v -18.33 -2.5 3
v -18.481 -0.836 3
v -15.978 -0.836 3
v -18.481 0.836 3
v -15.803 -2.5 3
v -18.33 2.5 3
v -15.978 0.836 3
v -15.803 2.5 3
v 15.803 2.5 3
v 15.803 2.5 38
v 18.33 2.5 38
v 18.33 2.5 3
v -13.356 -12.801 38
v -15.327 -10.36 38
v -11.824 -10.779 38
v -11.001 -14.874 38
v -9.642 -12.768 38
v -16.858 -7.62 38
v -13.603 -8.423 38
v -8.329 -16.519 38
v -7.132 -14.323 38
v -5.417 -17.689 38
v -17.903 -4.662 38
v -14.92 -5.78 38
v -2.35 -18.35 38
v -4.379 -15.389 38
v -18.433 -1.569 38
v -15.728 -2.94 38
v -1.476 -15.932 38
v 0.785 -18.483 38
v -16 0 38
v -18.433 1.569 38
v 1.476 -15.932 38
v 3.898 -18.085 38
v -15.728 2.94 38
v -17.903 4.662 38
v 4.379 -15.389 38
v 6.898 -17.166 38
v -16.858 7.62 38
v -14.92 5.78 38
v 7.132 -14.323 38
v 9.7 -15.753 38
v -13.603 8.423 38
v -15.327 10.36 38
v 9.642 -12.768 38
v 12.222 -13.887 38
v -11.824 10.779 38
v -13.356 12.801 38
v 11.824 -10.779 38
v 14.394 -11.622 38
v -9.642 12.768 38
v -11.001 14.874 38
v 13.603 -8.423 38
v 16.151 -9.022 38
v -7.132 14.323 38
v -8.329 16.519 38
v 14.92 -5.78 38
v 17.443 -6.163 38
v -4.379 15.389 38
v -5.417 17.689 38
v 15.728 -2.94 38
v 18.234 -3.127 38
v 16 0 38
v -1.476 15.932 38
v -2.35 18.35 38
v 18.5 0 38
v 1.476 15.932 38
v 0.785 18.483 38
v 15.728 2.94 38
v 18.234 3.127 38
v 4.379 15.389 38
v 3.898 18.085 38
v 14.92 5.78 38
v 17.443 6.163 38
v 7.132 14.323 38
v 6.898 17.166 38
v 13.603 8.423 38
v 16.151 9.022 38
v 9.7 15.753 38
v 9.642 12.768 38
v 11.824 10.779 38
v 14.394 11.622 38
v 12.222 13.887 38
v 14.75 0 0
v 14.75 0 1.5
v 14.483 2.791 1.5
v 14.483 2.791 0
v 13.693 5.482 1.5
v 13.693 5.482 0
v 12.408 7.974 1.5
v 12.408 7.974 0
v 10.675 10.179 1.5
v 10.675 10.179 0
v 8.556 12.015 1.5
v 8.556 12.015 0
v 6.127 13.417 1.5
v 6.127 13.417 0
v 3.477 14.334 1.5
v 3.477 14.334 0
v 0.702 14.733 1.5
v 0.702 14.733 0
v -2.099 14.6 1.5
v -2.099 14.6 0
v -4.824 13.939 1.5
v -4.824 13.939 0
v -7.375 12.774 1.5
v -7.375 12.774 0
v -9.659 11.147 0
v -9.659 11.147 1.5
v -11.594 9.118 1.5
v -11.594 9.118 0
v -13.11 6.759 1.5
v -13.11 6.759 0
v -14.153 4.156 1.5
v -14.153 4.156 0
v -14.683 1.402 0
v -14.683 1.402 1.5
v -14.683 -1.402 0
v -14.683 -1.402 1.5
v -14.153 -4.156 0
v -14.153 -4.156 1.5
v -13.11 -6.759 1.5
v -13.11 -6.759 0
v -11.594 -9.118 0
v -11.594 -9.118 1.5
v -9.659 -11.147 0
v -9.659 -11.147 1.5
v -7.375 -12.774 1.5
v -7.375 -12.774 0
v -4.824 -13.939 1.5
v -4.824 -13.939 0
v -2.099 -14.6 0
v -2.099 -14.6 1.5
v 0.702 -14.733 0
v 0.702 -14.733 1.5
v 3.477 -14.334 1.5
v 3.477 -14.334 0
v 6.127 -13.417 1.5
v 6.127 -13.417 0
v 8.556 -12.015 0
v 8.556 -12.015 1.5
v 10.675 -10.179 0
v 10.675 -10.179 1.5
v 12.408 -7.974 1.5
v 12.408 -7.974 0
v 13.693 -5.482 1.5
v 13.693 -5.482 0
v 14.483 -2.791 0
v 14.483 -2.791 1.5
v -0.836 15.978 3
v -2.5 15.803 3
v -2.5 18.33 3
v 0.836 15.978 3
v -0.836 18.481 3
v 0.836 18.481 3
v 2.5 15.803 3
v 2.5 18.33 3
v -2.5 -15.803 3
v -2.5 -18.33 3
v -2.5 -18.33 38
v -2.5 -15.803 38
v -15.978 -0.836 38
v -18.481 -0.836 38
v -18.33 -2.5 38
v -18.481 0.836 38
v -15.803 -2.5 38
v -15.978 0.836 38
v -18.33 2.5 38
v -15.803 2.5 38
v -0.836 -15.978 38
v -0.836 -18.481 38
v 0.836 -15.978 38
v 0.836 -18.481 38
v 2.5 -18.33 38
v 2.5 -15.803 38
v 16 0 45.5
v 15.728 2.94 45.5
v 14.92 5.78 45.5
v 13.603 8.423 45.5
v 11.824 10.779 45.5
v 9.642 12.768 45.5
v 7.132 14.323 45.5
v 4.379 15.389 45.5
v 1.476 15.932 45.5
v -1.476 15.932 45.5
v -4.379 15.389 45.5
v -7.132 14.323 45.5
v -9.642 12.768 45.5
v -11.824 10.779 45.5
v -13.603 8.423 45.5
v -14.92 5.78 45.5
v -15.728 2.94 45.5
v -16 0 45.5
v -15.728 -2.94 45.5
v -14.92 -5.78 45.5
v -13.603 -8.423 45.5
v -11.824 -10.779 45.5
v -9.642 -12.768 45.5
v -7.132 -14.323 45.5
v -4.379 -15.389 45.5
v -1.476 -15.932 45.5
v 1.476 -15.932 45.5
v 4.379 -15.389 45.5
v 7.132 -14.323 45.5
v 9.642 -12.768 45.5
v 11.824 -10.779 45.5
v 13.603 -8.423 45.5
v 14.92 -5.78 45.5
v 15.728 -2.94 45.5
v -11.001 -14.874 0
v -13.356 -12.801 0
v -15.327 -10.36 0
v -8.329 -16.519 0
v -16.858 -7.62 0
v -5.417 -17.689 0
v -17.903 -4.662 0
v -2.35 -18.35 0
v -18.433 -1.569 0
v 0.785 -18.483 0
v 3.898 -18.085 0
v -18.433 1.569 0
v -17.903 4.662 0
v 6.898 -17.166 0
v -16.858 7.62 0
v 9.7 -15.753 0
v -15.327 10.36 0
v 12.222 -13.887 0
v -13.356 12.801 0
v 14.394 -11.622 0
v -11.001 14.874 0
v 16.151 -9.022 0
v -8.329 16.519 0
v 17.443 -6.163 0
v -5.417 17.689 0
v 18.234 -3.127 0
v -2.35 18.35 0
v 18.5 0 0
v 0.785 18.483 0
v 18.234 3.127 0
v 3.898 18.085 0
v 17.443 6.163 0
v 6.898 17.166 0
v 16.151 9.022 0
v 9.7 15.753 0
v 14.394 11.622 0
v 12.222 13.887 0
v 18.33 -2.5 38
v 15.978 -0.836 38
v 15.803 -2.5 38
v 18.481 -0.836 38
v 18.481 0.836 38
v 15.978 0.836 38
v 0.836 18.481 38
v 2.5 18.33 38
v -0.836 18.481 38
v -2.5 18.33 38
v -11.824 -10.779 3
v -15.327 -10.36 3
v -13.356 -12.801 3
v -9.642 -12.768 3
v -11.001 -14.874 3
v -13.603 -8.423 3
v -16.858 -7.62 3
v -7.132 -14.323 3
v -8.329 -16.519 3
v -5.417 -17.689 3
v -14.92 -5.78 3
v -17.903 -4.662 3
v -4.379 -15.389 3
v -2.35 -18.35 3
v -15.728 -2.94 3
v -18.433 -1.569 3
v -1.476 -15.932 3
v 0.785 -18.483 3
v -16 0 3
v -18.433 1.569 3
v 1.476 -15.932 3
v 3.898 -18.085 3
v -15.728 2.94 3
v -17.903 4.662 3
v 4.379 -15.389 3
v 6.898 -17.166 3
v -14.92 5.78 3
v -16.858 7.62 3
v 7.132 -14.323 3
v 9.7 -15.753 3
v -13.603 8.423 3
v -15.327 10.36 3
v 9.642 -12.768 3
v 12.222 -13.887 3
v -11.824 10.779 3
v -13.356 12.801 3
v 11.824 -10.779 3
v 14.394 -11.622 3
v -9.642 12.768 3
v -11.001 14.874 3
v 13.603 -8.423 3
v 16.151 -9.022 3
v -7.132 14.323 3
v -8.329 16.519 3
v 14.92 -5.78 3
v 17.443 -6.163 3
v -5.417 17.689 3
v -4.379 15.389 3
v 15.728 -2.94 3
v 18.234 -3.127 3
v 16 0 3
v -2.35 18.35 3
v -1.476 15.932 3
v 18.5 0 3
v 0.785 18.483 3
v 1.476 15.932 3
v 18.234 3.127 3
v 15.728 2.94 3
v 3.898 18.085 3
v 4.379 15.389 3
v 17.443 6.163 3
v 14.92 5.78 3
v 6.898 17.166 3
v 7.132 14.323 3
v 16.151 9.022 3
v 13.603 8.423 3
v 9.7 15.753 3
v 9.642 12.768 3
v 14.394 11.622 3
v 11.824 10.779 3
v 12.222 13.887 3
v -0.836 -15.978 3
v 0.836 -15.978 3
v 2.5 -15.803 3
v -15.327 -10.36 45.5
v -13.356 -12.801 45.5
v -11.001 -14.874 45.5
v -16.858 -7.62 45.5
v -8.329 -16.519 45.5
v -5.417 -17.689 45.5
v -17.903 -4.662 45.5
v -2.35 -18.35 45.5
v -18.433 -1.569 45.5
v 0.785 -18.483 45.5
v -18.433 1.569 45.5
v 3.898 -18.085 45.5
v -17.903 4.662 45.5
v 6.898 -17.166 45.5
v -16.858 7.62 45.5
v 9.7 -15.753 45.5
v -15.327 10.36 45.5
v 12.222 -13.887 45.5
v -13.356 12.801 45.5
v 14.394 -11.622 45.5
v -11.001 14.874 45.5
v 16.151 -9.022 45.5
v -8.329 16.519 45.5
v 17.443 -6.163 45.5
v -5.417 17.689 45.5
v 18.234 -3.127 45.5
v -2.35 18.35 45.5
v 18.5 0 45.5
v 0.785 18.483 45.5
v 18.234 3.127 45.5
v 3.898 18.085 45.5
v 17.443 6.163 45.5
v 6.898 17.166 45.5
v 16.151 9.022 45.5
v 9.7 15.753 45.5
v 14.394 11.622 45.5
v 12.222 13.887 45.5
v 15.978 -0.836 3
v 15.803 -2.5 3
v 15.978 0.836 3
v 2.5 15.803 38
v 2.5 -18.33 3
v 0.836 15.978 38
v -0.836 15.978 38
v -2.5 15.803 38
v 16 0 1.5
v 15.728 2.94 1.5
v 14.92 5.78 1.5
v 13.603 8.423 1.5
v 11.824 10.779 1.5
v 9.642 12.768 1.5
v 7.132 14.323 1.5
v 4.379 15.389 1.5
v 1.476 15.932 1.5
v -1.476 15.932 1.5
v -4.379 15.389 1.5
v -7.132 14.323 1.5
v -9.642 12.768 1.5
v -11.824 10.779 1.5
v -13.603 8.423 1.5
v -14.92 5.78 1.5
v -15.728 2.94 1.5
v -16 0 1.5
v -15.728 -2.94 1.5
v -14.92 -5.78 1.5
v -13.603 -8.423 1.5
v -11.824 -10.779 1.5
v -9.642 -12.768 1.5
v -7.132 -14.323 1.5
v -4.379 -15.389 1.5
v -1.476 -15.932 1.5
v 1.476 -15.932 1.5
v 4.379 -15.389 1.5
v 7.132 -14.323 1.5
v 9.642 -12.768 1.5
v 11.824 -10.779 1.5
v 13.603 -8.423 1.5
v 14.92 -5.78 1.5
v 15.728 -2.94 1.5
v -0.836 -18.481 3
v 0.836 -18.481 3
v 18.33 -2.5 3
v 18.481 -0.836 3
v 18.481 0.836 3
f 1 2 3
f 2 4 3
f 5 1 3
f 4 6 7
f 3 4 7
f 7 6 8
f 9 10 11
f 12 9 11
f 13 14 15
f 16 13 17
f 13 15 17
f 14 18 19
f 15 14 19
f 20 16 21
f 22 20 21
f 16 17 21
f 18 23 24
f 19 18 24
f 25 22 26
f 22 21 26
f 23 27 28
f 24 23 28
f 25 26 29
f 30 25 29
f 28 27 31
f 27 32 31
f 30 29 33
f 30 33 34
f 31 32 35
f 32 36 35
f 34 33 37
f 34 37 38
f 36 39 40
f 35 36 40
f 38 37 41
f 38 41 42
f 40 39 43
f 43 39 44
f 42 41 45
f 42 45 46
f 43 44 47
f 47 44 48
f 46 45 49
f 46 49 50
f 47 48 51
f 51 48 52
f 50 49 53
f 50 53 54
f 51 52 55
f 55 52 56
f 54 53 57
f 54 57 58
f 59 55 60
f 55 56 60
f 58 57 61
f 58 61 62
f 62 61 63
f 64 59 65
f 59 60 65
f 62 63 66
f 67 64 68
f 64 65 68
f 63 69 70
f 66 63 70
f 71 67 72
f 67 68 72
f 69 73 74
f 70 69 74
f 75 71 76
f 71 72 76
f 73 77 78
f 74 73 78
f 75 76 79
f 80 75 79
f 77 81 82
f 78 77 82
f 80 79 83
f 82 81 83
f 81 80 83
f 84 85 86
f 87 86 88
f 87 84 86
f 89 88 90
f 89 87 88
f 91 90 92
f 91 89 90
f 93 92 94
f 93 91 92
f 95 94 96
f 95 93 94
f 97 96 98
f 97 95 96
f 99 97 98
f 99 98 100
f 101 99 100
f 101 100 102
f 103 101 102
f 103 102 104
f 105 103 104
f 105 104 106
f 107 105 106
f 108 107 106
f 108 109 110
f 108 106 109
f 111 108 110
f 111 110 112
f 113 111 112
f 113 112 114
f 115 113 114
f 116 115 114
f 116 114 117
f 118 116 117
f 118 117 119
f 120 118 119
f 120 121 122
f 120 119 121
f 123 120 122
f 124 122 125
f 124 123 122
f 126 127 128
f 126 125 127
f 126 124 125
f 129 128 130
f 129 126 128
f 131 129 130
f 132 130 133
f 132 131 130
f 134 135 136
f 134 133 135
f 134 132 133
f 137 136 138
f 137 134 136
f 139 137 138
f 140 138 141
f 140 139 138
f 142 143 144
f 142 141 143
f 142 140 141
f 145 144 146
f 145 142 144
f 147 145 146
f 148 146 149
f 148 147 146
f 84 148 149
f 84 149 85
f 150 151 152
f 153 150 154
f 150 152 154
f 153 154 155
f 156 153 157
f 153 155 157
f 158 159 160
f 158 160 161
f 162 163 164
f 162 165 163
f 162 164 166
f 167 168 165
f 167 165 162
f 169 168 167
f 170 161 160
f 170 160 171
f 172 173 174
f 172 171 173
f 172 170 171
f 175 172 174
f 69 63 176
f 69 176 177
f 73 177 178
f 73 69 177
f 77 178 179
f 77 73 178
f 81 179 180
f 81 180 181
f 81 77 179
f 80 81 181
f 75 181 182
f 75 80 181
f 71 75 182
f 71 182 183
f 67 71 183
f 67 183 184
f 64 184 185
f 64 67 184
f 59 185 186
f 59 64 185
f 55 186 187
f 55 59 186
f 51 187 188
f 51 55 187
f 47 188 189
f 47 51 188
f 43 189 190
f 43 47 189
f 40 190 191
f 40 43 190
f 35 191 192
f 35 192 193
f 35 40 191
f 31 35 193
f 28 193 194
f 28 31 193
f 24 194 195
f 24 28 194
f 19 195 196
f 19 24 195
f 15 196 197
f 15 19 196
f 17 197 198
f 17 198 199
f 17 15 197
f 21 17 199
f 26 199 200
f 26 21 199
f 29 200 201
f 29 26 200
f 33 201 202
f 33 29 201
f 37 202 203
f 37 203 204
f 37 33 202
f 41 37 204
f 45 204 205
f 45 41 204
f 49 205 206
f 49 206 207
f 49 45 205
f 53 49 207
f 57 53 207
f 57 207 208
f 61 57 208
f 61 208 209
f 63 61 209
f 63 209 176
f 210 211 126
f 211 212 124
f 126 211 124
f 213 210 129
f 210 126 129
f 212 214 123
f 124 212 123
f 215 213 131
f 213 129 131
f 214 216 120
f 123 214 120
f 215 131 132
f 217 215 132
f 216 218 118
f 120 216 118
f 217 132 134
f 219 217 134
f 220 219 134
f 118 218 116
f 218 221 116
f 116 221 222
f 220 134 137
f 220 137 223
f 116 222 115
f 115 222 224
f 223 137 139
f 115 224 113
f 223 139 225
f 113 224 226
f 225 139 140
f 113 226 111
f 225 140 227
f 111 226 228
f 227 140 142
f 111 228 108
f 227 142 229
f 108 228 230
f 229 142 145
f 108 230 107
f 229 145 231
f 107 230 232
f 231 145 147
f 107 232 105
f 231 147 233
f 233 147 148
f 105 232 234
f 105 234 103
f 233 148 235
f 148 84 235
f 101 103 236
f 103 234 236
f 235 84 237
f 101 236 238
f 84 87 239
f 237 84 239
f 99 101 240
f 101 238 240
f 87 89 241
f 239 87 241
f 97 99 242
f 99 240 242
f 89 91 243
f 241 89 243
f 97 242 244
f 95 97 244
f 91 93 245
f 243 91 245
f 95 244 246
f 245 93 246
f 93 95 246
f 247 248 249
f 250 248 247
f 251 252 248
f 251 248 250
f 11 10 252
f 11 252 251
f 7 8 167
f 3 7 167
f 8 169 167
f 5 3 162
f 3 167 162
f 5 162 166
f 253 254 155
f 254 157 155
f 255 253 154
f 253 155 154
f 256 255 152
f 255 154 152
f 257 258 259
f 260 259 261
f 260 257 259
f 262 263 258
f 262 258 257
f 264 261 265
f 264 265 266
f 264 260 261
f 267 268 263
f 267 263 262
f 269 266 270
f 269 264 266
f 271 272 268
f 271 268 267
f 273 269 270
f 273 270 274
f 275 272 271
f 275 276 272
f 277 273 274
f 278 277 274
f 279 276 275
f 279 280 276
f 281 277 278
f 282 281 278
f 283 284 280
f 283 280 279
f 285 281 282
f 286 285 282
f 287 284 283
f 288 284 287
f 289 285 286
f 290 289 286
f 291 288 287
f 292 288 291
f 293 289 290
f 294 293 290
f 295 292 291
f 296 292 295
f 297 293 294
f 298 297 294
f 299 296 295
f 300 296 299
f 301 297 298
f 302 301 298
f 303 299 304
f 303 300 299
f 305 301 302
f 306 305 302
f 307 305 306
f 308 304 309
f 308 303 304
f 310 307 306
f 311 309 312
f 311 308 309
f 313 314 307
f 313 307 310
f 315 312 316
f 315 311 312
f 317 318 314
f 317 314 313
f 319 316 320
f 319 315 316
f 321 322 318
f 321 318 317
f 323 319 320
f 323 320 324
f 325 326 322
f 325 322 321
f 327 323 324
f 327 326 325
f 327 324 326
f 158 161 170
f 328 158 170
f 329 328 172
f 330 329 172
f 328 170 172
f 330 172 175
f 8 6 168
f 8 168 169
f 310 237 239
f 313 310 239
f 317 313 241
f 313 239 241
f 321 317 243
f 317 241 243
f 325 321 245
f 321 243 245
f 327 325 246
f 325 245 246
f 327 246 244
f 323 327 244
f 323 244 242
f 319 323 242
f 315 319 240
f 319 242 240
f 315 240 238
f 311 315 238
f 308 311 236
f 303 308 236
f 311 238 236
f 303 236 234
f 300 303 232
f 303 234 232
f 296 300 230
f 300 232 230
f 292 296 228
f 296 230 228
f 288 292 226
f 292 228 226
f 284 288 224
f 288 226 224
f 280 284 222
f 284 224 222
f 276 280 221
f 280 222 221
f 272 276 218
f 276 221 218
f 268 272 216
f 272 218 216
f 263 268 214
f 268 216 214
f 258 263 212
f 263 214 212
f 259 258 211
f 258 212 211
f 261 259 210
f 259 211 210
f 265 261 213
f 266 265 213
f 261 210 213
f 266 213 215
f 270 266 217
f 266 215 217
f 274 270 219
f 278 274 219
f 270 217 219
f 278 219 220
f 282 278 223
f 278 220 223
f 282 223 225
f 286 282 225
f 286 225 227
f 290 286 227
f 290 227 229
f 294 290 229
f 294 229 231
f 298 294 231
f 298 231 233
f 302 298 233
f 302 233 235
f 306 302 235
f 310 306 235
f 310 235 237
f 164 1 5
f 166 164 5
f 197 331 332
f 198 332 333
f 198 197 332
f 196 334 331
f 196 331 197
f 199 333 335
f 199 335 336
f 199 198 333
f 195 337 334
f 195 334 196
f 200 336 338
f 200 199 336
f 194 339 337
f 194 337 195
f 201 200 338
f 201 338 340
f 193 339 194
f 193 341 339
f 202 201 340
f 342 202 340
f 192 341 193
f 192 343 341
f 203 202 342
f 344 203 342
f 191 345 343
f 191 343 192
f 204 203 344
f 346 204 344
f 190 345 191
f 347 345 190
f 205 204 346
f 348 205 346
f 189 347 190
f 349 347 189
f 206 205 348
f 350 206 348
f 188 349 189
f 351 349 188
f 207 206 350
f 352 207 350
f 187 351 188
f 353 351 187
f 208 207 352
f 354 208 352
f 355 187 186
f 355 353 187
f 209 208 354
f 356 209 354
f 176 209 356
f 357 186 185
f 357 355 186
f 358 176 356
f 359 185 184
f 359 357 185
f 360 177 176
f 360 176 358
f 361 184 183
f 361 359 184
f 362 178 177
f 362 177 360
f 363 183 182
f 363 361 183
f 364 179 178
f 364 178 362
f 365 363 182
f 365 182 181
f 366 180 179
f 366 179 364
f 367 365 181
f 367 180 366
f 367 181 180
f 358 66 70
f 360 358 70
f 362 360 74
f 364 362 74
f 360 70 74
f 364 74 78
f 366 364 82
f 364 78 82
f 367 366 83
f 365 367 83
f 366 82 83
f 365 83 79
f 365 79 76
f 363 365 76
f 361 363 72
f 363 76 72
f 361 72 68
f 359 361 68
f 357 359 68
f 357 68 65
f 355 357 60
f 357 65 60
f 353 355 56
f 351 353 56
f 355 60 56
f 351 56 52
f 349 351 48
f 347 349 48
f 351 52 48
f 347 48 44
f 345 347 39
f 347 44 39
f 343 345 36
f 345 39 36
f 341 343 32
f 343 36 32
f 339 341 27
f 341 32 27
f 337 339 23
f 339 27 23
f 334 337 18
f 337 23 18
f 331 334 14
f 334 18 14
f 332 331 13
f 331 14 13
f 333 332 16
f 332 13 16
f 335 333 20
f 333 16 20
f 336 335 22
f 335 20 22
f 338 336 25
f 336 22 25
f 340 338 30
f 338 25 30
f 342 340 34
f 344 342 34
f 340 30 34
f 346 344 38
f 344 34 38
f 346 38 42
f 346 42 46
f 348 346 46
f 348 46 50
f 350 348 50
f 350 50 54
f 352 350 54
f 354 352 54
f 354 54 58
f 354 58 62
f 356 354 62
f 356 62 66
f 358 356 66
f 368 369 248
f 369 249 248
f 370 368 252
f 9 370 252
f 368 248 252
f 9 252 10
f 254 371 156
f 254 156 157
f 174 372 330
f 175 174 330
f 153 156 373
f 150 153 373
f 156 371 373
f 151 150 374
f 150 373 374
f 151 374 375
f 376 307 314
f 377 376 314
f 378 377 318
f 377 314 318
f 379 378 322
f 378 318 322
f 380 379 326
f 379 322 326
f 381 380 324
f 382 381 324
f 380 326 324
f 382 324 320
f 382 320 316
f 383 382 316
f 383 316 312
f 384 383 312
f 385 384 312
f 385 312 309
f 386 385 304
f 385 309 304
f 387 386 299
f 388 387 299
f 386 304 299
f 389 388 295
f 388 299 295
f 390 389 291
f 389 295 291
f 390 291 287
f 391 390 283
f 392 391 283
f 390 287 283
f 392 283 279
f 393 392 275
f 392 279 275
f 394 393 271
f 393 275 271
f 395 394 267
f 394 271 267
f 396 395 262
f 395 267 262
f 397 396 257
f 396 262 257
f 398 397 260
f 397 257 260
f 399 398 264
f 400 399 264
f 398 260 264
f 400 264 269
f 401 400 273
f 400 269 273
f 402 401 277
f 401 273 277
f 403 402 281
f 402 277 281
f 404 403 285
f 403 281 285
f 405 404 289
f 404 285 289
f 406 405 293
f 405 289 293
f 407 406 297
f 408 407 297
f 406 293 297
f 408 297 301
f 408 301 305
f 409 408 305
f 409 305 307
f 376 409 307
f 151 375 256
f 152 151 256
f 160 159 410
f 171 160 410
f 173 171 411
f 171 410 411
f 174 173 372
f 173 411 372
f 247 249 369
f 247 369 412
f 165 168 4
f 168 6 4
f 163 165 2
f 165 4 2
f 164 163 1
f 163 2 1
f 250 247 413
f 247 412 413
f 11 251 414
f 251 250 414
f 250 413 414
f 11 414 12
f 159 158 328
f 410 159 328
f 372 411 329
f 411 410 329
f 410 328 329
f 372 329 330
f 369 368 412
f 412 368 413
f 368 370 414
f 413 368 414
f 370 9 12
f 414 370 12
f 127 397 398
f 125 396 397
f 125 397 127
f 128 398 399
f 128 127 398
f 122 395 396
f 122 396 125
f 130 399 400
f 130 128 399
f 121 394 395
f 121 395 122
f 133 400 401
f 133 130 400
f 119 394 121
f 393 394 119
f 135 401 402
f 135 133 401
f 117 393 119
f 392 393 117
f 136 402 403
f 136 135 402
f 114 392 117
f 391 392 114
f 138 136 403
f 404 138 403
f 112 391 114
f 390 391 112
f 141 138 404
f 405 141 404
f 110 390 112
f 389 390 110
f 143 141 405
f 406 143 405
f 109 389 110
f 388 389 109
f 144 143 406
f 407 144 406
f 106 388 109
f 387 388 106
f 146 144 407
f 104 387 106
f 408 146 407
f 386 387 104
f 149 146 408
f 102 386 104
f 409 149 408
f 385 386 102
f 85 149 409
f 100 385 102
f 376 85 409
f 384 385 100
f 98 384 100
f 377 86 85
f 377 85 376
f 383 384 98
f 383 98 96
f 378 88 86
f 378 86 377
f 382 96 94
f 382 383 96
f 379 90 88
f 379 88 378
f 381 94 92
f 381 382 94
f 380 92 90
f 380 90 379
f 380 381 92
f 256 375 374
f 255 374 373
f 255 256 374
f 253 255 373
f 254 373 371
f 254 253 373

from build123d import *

# Parameters (mm, degrees)
F0_R      = 18.5
F0_R_2    = 14.75
F1_DEPTH  = 45
F2_R      = 16
F2_R_2    = 14.75
F3_DEPTH  = 43
F5_W      = 34.343095
F5_H      = 5
F5_W_2    = 5
F5_H_2    = 31.673071
F6_DEPTH  = 35
F7_R      = 18.5
F7_R_2    = 14.75
F8_DEPTH  = 3
F10_R     = 18.5
F10_R_2   = 16
F11_DEPTH = 7.5
F12_R     = 16
F13_DEPTH = 1.5


with BuildPart() as f1:
    # F0 (on Top) → F1 (new body)
    with BuildSketch(Plane.XY):
        Circle(F0_R)
        Circle(F0_R_2, mode=Mode.SUBTRACT)
    extrude(amount=F1_DEPTH)

    # F2 (on face) → F3 (cut)
    with BuildSketch(Plane.XY.offset(45)):
        Circle(F2_R)
        Circle(F2_R_2, mode=Mode.SUBTRACT)
    extrude(amount=-F3_DEPTH, mode=Mode.SUBTRACT)

    # F5 (on offset) → F6 (intersect)
    with BuildSketch(Plane.XY.offset(3)):
        with Locations((19.671547, 0)):
            Rectangle(F5_W, F5_H)
        with Locations((0, 18.336536)):
            Rectangle(F5_W_2, F5_H_2)
        with Locations((-19.671547, 0)):
            Rectangle(F5_W, F5_H)
        with Locations((0, -18.336536)):
            Rectangle(F5_W_2, F5_H_2)
    extrude(amount=F6_DEPTH, mode=Mode.INTERSECT)


with BuildPart() as f8:
    # F7 (on Top) → F8 (new body)
    with BuildSketch(Plane.XY):
        Circle(F7_R)
        Circle(F7_R_2, mode=Mode.SUBTRACT)
    extrude(amount=F8_DEPTH)

    # F12 (on face) → F13 (cut)
    with BuildSketch(Plane.XY.offset(3)):
        Circle(F12_R)
    extrude(amount=-F13_DEPTH, mode=Mode.SUBTRACT)


with BuildPart() as f11:
    # F10 (on offset) → F11 (new body)
    with BuildSketch(Plane.XY.offset(38)):
        Circle(F10_R)
        Circle(F10_R_2, mode=Mode.SUBTRACT)
    extrude(amount=F11_DEPTH)


solid = Compound([f1.part, f8.part, f11.part])
